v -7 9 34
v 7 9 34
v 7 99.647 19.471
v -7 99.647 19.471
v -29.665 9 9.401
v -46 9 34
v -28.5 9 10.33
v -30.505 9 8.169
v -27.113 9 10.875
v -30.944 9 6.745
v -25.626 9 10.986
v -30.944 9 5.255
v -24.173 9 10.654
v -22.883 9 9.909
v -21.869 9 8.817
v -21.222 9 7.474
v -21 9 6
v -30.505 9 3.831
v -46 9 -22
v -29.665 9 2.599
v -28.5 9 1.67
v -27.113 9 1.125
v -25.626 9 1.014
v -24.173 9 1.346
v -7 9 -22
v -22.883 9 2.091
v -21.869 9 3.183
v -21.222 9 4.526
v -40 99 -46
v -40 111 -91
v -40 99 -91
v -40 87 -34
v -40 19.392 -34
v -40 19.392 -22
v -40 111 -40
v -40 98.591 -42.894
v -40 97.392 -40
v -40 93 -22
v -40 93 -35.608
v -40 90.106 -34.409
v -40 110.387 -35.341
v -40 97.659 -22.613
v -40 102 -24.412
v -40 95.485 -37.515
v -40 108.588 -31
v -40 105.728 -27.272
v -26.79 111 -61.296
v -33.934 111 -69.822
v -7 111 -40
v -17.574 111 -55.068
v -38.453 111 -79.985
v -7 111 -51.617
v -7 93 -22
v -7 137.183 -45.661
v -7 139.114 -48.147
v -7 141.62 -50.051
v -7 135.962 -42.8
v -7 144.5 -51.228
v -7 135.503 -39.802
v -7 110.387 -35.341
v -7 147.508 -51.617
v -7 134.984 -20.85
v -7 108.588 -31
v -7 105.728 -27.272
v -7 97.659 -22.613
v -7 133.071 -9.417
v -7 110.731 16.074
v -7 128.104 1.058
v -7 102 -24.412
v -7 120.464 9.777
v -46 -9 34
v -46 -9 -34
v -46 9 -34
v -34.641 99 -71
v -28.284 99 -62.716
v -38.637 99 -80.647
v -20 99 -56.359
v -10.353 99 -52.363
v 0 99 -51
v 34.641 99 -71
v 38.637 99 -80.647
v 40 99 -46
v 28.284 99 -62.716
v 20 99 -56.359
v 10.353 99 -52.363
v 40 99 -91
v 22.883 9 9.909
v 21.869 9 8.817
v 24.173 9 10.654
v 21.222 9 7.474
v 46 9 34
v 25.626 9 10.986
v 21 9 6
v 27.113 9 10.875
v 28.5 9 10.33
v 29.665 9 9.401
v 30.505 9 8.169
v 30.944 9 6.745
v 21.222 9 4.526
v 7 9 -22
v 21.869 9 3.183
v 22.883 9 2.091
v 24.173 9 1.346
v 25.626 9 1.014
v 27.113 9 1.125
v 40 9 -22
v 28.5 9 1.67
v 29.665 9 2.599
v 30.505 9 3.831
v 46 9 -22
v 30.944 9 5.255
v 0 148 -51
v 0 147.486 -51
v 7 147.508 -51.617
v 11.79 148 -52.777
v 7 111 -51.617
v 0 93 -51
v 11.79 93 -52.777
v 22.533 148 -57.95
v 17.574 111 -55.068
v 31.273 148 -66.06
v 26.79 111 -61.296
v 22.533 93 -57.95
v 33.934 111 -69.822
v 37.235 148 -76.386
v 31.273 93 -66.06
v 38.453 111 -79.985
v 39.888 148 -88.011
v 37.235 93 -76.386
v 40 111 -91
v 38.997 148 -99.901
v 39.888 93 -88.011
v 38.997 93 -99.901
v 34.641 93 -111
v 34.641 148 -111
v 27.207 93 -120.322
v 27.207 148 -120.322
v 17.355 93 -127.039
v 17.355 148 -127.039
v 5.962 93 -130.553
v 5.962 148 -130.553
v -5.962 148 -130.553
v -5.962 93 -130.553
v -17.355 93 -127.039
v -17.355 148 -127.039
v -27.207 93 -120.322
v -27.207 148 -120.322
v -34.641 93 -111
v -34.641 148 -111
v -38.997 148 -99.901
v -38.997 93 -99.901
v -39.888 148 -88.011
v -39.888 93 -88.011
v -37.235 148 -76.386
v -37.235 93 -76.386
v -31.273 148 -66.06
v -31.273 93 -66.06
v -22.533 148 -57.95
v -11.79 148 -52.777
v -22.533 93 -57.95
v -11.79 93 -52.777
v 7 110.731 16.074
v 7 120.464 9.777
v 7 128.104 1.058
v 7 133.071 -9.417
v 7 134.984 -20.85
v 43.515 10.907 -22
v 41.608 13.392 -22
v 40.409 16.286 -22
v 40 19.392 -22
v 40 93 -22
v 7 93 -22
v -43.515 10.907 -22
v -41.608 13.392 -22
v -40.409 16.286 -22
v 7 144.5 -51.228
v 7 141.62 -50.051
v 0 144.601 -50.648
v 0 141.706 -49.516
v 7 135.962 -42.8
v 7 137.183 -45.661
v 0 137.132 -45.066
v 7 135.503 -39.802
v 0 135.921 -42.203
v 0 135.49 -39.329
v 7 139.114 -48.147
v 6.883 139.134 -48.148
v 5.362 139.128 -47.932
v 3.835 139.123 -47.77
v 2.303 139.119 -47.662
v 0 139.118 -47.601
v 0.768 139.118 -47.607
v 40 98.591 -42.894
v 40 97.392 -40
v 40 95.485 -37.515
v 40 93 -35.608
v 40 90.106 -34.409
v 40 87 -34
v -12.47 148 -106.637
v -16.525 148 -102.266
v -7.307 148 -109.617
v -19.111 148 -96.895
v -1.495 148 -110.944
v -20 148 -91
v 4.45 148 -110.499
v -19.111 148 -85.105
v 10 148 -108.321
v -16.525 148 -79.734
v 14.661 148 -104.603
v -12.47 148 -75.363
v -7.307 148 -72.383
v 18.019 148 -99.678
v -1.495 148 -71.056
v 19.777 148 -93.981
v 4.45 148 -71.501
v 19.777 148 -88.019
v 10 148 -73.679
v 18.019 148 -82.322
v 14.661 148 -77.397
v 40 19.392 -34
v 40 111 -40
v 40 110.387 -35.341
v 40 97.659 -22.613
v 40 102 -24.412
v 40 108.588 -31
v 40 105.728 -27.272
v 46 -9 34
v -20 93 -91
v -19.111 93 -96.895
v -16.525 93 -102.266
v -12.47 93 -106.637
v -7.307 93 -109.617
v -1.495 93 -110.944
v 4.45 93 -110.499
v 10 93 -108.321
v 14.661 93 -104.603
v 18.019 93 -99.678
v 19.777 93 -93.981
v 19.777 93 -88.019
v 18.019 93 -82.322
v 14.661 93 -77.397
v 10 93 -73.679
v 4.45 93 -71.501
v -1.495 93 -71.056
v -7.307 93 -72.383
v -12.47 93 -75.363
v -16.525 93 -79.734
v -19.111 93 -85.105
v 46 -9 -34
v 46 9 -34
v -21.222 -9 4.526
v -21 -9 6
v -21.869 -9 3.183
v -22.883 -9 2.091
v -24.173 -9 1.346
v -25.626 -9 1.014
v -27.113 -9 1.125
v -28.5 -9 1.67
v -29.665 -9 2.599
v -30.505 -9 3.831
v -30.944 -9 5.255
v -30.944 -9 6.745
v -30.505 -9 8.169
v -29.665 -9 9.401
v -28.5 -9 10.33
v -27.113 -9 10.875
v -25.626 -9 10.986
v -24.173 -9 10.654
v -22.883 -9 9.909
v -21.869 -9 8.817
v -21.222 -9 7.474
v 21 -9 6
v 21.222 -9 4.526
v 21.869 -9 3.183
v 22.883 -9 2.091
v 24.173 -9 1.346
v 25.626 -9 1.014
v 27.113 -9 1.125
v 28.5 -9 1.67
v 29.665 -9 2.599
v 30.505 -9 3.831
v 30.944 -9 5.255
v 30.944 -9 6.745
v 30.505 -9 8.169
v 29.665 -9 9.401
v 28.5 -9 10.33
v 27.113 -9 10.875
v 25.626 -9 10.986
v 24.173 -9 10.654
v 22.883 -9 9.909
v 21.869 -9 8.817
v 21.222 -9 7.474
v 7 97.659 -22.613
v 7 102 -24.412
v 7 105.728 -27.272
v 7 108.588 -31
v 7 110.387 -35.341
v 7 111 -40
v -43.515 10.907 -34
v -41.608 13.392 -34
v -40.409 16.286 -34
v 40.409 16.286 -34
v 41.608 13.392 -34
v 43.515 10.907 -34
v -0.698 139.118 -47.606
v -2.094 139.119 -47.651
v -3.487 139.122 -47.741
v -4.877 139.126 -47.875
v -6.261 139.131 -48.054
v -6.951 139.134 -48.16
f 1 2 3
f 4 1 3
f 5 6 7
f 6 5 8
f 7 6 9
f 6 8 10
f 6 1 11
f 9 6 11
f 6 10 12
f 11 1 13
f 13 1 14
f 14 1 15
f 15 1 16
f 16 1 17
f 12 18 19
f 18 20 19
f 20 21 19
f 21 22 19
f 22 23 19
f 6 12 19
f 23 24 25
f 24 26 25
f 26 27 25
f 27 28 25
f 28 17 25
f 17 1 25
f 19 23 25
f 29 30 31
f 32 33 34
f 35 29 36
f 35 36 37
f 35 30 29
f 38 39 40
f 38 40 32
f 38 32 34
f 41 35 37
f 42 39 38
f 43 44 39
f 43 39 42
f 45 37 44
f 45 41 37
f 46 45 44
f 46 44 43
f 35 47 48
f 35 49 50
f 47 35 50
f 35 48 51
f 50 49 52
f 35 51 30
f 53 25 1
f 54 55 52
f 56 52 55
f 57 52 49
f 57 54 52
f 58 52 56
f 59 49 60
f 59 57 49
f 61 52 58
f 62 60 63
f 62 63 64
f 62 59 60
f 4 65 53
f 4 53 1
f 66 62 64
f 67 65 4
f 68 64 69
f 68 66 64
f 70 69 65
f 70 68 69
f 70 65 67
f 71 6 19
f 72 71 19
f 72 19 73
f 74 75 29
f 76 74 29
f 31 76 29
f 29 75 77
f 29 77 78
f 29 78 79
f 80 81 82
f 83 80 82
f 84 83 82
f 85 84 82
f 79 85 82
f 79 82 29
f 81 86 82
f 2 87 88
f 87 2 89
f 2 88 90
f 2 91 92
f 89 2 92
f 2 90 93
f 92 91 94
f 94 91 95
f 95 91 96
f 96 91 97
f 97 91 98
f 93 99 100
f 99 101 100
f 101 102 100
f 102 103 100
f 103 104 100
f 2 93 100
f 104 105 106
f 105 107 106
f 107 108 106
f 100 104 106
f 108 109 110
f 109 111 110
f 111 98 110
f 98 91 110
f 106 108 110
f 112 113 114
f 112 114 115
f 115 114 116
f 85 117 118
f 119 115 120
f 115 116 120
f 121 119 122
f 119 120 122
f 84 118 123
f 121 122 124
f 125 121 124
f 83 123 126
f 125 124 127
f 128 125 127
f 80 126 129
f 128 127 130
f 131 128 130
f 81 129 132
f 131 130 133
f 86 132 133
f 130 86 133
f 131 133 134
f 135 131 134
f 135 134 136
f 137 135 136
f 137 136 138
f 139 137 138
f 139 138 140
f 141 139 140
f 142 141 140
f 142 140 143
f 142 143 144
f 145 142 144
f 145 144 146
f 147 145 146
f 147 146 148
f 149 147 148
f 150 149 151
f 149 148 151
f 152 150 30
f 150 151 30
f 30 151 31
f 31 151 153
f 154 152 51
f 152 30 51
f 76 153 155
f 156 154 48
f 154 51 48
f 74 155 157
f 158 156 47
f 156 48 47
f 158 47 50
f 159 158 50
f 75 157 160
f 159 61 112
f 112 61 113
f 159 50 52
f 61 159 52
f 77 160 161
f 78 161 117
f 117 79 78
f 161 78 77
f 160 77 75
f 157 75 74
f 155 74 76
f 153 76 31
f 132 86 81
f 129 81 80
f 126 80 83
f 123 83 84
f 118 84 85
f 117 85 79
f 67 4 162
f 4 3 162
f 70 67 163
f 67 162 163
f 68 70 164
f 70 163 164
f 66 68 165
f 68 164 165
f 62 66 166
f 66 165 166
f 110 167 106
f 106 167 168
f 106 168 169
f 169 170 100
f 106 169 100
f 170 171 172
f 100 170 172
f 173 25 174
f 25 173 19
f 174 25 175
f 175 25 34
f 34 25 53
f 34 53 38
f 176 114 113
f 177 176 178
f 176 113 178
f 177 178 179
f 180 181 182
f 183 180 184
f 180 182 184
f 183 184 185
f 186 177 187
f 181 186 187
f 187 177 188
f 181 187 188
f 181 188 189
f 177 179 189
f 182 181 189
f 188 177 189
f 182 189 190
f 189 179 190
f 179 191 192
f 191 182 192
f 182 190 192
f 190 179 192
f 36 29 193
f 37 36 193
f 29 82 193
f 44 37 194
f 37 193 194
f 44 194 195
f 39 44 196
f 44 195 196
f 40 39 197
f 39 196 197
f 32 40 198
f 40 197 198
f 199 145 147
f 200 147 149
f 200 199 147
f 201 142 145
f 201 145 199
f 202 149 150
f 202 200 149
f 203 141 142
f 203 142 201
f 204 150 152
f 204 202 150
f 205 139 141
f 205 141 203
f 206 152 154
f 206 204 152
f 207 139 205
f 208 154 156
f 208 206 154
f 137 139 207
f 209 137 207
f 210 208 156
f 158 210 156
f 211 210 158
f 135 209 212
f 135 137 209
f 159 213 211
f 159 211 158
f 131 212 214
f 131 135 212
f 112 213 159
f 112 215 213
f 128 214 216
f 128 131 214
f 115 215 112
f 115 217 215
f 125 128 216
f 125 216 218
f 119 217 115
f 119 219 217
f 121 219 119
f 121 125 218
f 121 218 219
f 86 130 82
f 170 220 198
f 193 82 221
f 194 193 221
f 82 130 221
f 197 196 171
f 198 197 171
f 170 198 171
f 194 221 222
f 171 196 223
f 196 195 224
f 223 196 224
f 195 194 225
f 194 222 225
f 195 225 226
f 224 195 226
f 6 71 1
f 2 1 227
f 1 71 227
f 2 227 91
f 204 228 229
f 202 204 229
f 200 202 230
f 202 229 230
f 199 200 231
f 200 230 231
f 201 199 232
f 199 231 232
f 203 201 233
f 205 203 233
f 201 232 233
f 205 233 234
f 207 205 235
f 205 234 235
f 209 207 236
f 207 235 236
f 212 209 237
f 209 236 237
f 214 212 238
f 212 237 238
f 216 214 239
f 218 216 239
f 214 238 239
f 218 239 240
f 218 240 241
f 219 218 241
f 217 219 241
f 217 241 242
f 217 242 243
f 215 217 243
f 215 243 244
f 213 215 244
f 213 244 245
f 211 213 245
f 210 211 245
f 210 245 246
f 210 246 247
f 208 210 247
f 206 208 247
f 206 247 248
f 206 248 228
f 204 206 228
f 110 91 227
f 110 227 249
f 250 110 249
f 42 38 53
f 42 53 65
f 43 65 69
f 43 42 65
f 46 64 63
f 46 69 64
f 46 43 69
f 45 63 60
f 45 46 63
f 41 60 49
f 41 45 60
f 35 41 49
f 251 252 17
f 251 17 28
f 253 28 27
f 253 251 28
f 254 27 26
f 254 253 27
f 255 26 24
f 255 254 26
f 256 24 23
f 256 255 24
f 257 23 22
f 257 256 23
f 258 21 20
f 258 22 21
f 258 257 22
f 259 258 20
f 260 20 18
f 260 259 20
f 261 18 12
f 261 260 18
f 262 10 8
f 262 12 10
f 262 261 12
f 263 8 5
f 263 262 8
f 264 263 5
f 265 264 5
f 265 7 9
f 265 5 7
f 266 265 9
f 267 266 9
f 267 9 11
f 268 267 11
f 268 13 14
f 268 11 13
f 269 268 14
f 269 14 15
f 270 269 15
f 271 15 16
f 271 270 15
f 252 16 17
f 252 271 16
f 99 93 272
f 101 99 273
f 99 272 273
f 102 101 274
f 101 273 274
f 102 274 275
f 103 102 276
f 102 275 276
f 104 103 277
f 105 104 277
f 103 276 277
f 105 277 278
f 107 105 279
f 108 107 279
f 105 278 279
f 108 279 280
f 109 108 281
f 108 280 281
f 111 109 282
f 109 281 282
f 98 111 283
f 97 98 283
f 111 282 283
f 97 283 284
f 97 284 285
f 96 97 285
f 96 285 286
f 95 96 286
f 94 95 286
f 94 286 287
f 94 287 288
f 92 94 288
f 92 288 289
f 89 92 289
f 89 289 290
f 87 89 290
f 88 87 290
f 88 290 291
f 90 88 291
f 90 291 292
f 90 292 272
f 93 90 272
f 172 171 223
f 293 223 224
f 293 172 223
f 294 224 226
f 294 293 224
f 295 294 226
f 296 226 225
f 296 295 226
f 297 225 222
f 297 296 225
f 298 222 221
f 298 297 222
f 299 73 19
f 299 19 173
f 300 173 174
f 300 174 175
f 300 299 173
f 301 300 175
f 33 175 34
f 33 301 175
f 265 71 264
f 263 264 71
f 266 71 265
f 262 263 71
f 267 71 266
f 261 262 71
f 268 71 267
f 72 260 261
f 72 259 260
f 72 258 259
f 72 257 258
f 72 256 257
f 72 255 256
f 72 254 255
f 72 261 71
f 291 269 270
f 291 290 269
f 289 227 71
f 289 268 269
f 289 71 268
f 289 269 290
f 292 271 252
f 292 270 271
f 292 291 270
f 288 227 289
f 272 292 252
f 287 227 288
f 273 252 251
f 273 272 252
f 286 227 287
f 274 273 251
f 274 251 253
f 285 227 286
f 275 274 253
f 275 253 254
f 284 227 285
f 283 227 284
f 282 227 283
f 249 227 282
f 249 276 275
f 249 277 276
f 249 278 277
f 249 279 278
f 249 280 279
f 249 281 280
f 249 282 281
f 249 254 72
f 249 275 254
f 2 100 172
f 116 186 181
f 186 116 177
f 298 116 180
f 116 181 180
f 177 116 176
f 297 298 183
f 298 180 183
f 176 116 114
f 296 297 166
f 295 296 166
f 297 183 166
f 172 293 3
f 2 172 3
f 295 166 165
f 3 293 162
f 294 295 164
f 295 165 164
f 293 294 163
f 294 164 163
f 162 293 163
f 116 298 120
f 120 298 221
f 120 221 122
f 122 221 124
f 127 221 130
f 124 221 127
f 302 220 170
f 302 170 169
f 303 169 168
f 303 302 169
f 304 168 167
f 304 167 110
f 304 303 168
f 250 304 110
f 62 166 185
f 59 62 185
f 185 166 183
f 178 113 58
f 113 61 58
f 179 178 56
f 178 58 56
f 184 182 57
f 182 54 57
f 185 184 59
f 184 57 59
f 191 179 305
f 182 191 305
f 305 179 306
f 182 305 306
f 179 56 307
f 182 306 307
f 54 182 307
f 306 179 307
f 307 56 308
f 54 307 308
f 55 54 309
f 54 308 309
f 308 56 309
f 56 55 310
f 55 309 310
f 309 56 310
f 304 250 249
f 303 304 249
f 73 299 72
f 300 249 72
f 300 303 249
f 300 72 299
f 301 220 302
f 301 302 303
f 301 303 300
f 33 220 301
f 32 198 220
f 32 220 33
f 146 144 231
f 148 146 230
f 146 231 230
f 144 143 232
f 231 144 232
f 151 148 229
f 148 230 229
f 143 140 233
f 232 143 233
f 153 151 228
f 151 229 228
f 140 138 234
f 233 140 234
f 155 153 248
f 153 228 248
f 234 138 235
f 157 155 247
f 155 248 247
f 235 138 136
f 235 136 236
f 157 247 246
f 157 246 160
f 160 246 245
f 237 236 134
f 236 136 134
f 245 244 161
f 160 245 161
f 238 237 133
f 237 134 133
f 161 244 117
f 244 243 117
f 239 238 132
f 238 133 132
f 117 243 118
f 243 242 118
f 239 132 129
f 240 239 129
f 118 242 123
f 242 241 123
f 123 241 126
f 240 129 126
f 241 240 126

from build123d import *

# Parameters (mm, degrees)
SKETCH1_W                = 68
SKETCH1_H                = 18
BOSS_EXTRUDE1_DEPTH      = 46
BOSS_EXTRUDE2_DEPTH      = 40
FILLET1_R                = 12
FILLET3_R                = 18
FILLET4_R                = 12
BOSS_EXTRUDE3_DEPTH      = 37
BOSS_EXTRUDE3_DEPTH_BACK = 18
SKETCH3_R                = 40
HOLE1_D                  = 40
BOSS_EXTRUDE5_DEPTH      = 7
FILLET5_R                = 12
HOLE2_D                  = 10


with BuildPart() as part:
    # Sketch1 → Boss-Extrude1 (new, symmetric)
    with BuildSketch(Plane(origin=(0, 0, 0), x_dir=(0, 0, -1), z_dir=(1, 0, 0))):
        Rectangle(SKETCH1_W, SKETCH1_H)
    extrude(amount=BOSS_EXTRUDE1_DEPTH, both=True)

    # Sketch2 → Boss-Extrude2 (add, symmetric)
    with BuildSketch(Plane(origin=(0, 0, 0), x_dir=(0, 0, -1), z_dir=(1, 0, 0))):
        Polygon((34, 9), (22, 9), (22, 111), (91, 111), (91, 99), (34, 99), align=None)
    extrude(amount=BOSS_EXTRUDE2_DEPTH, both=True)

    # Fillet1
    # the kernel refuses this fillet: 12 mm, written as the material it adds along each edge
    with BuildSketch(Plane(origin=(-40, 9, -34), x_dir=(-1, 0, 0), z_dir=(0, 0, 1))) as fillet1_piece_1:
        with BuildLine():
            CenterArc((12, -10.392304845), FILLET1_R, 120, 60)
            Line((0, -10.392304845), (-0.24, -10.392304845))
            Line((-0.24, -10.392304845), (-0.24, 0))
            Line((-0.24, 0), (0, 0.24))
            ThreePointArc((0, 0.24), (3, 0.24), (5.88, 0.207846097))
            Line((5.88, 0.207846097), (6, 0))
        make_face()
    extrude(amount=12)
    with BuildSketch(Plane(origin=(40, 9, -34), x_dir=(1, 0, 0), z_dir=(0, 0, 1))) as fillet1_piece_2:
        with BuildLine():
            CenterArc((12, 10.392304845), FILLET1_R, 180, 60)
            Line((0, 10.392304845), (-0.24, 10.392304845))
            Line((-0.24, 10.392304845), (-0.24, 0))
            Line((-0.24, 0), (0, -0.24))
            ThreePointArc((0, -0.24), (3, -0.24), (5.88, -0.207846097))
            Line((5.88, -0.207846097), (6, 0))
        make_face()
    extrude(amount=12)

    # Fillet3
    fillet3_edges = [part.edges().sort_by_distance(p)[0] for p in [
        (0, 111, -22),
    ]]
    fillet(fillet3_edges, radius=FILLET3_R)

    # Fillet4
    fillet4_edges = [part.edges().sort_by_distance(p)[0] for p in [
        (0, 99, -34),
    ]]
    fillet(fillet4_edges, radius=FILLET4_R)

    # Sketch3 → Boss-Extrude3 (add, two sides: drawn at the far end of the back side and taken through both)
    with BuildSketch(Plane(origin=(0, 111, 0), x_dir=(1, 0, 0), z_dir=(0, 1, 0)).offset(-BOSS_EXTRUDE3_DEPTH_BACK)):
        with Locations(Location((0, 91, 0), (0, 0, 270))):
            Circle(SKETCH3_R)
    extrude(amount=BOSS_EXTRUDE3_DEPTH + BOSS_EXTRUDE3_DEPTH_BACK)

    # Hole1 (through all)
    with Locations(Plane(origin=(0, 148, 0), x_dir=(1, 0, 0), z_dir=(0, 1, 0))):
        with Locations((0, 91)):
            Hole(HOLE1_D / 2)

    # Sketch6 → Boss-Extrude5 (add, symmetric)
    with BuildSketch(Plane(origin=(0, 0, 0), x_dir=(0, 0, -1), z_dir=(1, 0, 0))):
        with BuildLine():
            Line((-34, 9), (-19.470663618, 99.647109079))
            ThreePointArc((-19.470663618, 99.647109079), (-5.682290367, 124.586243842), (20.849974888, 134.984252313))
            Line((20.849974888, 134.984252313), (57.932127912, 136))
            Line((57.932127912, 136), (57.932127912, 111))
            Line((57.932127912, 111), (40, 111))
            ThreePointArc((40, 111), (27.272077939, 105.727922061), (22, 93))
            Line((22, 93), (22, 19.392304845))
            Line((22, 19.392304845), (22, 9))
            Line((22, 9), (-34, 9))
        make_face()
    extrude(amount=BOSS_EXTRUDE5_DEPTH, both=True)

    # Fillet5
    fillet5_edges = [part.edges().sort_by_distance(p)[0] for p in [
        (3.513591356, 135.814351592, -51.154615377),
    ]]
    fillet(fillet5_edges, radius=FILLET5_R)

    # Hole2 (through all)
    with Locations(Plane(origin=(0, 9, 0), x_dir=(1, 0, 0), z_dir=(0, 1, 0))):
        with Locations((26, -6)):
            hole2 = Hole(HOLE2_D / 2)

    # Mirror1: Hole2 across plane
    add(hole2.mirror(Plane(origin=(0, 0, 0), x_dir=(0, 0, 1), z_dir=(1, 0, 0))), mode=Mode.SUBTRACT)


solid = part.part
